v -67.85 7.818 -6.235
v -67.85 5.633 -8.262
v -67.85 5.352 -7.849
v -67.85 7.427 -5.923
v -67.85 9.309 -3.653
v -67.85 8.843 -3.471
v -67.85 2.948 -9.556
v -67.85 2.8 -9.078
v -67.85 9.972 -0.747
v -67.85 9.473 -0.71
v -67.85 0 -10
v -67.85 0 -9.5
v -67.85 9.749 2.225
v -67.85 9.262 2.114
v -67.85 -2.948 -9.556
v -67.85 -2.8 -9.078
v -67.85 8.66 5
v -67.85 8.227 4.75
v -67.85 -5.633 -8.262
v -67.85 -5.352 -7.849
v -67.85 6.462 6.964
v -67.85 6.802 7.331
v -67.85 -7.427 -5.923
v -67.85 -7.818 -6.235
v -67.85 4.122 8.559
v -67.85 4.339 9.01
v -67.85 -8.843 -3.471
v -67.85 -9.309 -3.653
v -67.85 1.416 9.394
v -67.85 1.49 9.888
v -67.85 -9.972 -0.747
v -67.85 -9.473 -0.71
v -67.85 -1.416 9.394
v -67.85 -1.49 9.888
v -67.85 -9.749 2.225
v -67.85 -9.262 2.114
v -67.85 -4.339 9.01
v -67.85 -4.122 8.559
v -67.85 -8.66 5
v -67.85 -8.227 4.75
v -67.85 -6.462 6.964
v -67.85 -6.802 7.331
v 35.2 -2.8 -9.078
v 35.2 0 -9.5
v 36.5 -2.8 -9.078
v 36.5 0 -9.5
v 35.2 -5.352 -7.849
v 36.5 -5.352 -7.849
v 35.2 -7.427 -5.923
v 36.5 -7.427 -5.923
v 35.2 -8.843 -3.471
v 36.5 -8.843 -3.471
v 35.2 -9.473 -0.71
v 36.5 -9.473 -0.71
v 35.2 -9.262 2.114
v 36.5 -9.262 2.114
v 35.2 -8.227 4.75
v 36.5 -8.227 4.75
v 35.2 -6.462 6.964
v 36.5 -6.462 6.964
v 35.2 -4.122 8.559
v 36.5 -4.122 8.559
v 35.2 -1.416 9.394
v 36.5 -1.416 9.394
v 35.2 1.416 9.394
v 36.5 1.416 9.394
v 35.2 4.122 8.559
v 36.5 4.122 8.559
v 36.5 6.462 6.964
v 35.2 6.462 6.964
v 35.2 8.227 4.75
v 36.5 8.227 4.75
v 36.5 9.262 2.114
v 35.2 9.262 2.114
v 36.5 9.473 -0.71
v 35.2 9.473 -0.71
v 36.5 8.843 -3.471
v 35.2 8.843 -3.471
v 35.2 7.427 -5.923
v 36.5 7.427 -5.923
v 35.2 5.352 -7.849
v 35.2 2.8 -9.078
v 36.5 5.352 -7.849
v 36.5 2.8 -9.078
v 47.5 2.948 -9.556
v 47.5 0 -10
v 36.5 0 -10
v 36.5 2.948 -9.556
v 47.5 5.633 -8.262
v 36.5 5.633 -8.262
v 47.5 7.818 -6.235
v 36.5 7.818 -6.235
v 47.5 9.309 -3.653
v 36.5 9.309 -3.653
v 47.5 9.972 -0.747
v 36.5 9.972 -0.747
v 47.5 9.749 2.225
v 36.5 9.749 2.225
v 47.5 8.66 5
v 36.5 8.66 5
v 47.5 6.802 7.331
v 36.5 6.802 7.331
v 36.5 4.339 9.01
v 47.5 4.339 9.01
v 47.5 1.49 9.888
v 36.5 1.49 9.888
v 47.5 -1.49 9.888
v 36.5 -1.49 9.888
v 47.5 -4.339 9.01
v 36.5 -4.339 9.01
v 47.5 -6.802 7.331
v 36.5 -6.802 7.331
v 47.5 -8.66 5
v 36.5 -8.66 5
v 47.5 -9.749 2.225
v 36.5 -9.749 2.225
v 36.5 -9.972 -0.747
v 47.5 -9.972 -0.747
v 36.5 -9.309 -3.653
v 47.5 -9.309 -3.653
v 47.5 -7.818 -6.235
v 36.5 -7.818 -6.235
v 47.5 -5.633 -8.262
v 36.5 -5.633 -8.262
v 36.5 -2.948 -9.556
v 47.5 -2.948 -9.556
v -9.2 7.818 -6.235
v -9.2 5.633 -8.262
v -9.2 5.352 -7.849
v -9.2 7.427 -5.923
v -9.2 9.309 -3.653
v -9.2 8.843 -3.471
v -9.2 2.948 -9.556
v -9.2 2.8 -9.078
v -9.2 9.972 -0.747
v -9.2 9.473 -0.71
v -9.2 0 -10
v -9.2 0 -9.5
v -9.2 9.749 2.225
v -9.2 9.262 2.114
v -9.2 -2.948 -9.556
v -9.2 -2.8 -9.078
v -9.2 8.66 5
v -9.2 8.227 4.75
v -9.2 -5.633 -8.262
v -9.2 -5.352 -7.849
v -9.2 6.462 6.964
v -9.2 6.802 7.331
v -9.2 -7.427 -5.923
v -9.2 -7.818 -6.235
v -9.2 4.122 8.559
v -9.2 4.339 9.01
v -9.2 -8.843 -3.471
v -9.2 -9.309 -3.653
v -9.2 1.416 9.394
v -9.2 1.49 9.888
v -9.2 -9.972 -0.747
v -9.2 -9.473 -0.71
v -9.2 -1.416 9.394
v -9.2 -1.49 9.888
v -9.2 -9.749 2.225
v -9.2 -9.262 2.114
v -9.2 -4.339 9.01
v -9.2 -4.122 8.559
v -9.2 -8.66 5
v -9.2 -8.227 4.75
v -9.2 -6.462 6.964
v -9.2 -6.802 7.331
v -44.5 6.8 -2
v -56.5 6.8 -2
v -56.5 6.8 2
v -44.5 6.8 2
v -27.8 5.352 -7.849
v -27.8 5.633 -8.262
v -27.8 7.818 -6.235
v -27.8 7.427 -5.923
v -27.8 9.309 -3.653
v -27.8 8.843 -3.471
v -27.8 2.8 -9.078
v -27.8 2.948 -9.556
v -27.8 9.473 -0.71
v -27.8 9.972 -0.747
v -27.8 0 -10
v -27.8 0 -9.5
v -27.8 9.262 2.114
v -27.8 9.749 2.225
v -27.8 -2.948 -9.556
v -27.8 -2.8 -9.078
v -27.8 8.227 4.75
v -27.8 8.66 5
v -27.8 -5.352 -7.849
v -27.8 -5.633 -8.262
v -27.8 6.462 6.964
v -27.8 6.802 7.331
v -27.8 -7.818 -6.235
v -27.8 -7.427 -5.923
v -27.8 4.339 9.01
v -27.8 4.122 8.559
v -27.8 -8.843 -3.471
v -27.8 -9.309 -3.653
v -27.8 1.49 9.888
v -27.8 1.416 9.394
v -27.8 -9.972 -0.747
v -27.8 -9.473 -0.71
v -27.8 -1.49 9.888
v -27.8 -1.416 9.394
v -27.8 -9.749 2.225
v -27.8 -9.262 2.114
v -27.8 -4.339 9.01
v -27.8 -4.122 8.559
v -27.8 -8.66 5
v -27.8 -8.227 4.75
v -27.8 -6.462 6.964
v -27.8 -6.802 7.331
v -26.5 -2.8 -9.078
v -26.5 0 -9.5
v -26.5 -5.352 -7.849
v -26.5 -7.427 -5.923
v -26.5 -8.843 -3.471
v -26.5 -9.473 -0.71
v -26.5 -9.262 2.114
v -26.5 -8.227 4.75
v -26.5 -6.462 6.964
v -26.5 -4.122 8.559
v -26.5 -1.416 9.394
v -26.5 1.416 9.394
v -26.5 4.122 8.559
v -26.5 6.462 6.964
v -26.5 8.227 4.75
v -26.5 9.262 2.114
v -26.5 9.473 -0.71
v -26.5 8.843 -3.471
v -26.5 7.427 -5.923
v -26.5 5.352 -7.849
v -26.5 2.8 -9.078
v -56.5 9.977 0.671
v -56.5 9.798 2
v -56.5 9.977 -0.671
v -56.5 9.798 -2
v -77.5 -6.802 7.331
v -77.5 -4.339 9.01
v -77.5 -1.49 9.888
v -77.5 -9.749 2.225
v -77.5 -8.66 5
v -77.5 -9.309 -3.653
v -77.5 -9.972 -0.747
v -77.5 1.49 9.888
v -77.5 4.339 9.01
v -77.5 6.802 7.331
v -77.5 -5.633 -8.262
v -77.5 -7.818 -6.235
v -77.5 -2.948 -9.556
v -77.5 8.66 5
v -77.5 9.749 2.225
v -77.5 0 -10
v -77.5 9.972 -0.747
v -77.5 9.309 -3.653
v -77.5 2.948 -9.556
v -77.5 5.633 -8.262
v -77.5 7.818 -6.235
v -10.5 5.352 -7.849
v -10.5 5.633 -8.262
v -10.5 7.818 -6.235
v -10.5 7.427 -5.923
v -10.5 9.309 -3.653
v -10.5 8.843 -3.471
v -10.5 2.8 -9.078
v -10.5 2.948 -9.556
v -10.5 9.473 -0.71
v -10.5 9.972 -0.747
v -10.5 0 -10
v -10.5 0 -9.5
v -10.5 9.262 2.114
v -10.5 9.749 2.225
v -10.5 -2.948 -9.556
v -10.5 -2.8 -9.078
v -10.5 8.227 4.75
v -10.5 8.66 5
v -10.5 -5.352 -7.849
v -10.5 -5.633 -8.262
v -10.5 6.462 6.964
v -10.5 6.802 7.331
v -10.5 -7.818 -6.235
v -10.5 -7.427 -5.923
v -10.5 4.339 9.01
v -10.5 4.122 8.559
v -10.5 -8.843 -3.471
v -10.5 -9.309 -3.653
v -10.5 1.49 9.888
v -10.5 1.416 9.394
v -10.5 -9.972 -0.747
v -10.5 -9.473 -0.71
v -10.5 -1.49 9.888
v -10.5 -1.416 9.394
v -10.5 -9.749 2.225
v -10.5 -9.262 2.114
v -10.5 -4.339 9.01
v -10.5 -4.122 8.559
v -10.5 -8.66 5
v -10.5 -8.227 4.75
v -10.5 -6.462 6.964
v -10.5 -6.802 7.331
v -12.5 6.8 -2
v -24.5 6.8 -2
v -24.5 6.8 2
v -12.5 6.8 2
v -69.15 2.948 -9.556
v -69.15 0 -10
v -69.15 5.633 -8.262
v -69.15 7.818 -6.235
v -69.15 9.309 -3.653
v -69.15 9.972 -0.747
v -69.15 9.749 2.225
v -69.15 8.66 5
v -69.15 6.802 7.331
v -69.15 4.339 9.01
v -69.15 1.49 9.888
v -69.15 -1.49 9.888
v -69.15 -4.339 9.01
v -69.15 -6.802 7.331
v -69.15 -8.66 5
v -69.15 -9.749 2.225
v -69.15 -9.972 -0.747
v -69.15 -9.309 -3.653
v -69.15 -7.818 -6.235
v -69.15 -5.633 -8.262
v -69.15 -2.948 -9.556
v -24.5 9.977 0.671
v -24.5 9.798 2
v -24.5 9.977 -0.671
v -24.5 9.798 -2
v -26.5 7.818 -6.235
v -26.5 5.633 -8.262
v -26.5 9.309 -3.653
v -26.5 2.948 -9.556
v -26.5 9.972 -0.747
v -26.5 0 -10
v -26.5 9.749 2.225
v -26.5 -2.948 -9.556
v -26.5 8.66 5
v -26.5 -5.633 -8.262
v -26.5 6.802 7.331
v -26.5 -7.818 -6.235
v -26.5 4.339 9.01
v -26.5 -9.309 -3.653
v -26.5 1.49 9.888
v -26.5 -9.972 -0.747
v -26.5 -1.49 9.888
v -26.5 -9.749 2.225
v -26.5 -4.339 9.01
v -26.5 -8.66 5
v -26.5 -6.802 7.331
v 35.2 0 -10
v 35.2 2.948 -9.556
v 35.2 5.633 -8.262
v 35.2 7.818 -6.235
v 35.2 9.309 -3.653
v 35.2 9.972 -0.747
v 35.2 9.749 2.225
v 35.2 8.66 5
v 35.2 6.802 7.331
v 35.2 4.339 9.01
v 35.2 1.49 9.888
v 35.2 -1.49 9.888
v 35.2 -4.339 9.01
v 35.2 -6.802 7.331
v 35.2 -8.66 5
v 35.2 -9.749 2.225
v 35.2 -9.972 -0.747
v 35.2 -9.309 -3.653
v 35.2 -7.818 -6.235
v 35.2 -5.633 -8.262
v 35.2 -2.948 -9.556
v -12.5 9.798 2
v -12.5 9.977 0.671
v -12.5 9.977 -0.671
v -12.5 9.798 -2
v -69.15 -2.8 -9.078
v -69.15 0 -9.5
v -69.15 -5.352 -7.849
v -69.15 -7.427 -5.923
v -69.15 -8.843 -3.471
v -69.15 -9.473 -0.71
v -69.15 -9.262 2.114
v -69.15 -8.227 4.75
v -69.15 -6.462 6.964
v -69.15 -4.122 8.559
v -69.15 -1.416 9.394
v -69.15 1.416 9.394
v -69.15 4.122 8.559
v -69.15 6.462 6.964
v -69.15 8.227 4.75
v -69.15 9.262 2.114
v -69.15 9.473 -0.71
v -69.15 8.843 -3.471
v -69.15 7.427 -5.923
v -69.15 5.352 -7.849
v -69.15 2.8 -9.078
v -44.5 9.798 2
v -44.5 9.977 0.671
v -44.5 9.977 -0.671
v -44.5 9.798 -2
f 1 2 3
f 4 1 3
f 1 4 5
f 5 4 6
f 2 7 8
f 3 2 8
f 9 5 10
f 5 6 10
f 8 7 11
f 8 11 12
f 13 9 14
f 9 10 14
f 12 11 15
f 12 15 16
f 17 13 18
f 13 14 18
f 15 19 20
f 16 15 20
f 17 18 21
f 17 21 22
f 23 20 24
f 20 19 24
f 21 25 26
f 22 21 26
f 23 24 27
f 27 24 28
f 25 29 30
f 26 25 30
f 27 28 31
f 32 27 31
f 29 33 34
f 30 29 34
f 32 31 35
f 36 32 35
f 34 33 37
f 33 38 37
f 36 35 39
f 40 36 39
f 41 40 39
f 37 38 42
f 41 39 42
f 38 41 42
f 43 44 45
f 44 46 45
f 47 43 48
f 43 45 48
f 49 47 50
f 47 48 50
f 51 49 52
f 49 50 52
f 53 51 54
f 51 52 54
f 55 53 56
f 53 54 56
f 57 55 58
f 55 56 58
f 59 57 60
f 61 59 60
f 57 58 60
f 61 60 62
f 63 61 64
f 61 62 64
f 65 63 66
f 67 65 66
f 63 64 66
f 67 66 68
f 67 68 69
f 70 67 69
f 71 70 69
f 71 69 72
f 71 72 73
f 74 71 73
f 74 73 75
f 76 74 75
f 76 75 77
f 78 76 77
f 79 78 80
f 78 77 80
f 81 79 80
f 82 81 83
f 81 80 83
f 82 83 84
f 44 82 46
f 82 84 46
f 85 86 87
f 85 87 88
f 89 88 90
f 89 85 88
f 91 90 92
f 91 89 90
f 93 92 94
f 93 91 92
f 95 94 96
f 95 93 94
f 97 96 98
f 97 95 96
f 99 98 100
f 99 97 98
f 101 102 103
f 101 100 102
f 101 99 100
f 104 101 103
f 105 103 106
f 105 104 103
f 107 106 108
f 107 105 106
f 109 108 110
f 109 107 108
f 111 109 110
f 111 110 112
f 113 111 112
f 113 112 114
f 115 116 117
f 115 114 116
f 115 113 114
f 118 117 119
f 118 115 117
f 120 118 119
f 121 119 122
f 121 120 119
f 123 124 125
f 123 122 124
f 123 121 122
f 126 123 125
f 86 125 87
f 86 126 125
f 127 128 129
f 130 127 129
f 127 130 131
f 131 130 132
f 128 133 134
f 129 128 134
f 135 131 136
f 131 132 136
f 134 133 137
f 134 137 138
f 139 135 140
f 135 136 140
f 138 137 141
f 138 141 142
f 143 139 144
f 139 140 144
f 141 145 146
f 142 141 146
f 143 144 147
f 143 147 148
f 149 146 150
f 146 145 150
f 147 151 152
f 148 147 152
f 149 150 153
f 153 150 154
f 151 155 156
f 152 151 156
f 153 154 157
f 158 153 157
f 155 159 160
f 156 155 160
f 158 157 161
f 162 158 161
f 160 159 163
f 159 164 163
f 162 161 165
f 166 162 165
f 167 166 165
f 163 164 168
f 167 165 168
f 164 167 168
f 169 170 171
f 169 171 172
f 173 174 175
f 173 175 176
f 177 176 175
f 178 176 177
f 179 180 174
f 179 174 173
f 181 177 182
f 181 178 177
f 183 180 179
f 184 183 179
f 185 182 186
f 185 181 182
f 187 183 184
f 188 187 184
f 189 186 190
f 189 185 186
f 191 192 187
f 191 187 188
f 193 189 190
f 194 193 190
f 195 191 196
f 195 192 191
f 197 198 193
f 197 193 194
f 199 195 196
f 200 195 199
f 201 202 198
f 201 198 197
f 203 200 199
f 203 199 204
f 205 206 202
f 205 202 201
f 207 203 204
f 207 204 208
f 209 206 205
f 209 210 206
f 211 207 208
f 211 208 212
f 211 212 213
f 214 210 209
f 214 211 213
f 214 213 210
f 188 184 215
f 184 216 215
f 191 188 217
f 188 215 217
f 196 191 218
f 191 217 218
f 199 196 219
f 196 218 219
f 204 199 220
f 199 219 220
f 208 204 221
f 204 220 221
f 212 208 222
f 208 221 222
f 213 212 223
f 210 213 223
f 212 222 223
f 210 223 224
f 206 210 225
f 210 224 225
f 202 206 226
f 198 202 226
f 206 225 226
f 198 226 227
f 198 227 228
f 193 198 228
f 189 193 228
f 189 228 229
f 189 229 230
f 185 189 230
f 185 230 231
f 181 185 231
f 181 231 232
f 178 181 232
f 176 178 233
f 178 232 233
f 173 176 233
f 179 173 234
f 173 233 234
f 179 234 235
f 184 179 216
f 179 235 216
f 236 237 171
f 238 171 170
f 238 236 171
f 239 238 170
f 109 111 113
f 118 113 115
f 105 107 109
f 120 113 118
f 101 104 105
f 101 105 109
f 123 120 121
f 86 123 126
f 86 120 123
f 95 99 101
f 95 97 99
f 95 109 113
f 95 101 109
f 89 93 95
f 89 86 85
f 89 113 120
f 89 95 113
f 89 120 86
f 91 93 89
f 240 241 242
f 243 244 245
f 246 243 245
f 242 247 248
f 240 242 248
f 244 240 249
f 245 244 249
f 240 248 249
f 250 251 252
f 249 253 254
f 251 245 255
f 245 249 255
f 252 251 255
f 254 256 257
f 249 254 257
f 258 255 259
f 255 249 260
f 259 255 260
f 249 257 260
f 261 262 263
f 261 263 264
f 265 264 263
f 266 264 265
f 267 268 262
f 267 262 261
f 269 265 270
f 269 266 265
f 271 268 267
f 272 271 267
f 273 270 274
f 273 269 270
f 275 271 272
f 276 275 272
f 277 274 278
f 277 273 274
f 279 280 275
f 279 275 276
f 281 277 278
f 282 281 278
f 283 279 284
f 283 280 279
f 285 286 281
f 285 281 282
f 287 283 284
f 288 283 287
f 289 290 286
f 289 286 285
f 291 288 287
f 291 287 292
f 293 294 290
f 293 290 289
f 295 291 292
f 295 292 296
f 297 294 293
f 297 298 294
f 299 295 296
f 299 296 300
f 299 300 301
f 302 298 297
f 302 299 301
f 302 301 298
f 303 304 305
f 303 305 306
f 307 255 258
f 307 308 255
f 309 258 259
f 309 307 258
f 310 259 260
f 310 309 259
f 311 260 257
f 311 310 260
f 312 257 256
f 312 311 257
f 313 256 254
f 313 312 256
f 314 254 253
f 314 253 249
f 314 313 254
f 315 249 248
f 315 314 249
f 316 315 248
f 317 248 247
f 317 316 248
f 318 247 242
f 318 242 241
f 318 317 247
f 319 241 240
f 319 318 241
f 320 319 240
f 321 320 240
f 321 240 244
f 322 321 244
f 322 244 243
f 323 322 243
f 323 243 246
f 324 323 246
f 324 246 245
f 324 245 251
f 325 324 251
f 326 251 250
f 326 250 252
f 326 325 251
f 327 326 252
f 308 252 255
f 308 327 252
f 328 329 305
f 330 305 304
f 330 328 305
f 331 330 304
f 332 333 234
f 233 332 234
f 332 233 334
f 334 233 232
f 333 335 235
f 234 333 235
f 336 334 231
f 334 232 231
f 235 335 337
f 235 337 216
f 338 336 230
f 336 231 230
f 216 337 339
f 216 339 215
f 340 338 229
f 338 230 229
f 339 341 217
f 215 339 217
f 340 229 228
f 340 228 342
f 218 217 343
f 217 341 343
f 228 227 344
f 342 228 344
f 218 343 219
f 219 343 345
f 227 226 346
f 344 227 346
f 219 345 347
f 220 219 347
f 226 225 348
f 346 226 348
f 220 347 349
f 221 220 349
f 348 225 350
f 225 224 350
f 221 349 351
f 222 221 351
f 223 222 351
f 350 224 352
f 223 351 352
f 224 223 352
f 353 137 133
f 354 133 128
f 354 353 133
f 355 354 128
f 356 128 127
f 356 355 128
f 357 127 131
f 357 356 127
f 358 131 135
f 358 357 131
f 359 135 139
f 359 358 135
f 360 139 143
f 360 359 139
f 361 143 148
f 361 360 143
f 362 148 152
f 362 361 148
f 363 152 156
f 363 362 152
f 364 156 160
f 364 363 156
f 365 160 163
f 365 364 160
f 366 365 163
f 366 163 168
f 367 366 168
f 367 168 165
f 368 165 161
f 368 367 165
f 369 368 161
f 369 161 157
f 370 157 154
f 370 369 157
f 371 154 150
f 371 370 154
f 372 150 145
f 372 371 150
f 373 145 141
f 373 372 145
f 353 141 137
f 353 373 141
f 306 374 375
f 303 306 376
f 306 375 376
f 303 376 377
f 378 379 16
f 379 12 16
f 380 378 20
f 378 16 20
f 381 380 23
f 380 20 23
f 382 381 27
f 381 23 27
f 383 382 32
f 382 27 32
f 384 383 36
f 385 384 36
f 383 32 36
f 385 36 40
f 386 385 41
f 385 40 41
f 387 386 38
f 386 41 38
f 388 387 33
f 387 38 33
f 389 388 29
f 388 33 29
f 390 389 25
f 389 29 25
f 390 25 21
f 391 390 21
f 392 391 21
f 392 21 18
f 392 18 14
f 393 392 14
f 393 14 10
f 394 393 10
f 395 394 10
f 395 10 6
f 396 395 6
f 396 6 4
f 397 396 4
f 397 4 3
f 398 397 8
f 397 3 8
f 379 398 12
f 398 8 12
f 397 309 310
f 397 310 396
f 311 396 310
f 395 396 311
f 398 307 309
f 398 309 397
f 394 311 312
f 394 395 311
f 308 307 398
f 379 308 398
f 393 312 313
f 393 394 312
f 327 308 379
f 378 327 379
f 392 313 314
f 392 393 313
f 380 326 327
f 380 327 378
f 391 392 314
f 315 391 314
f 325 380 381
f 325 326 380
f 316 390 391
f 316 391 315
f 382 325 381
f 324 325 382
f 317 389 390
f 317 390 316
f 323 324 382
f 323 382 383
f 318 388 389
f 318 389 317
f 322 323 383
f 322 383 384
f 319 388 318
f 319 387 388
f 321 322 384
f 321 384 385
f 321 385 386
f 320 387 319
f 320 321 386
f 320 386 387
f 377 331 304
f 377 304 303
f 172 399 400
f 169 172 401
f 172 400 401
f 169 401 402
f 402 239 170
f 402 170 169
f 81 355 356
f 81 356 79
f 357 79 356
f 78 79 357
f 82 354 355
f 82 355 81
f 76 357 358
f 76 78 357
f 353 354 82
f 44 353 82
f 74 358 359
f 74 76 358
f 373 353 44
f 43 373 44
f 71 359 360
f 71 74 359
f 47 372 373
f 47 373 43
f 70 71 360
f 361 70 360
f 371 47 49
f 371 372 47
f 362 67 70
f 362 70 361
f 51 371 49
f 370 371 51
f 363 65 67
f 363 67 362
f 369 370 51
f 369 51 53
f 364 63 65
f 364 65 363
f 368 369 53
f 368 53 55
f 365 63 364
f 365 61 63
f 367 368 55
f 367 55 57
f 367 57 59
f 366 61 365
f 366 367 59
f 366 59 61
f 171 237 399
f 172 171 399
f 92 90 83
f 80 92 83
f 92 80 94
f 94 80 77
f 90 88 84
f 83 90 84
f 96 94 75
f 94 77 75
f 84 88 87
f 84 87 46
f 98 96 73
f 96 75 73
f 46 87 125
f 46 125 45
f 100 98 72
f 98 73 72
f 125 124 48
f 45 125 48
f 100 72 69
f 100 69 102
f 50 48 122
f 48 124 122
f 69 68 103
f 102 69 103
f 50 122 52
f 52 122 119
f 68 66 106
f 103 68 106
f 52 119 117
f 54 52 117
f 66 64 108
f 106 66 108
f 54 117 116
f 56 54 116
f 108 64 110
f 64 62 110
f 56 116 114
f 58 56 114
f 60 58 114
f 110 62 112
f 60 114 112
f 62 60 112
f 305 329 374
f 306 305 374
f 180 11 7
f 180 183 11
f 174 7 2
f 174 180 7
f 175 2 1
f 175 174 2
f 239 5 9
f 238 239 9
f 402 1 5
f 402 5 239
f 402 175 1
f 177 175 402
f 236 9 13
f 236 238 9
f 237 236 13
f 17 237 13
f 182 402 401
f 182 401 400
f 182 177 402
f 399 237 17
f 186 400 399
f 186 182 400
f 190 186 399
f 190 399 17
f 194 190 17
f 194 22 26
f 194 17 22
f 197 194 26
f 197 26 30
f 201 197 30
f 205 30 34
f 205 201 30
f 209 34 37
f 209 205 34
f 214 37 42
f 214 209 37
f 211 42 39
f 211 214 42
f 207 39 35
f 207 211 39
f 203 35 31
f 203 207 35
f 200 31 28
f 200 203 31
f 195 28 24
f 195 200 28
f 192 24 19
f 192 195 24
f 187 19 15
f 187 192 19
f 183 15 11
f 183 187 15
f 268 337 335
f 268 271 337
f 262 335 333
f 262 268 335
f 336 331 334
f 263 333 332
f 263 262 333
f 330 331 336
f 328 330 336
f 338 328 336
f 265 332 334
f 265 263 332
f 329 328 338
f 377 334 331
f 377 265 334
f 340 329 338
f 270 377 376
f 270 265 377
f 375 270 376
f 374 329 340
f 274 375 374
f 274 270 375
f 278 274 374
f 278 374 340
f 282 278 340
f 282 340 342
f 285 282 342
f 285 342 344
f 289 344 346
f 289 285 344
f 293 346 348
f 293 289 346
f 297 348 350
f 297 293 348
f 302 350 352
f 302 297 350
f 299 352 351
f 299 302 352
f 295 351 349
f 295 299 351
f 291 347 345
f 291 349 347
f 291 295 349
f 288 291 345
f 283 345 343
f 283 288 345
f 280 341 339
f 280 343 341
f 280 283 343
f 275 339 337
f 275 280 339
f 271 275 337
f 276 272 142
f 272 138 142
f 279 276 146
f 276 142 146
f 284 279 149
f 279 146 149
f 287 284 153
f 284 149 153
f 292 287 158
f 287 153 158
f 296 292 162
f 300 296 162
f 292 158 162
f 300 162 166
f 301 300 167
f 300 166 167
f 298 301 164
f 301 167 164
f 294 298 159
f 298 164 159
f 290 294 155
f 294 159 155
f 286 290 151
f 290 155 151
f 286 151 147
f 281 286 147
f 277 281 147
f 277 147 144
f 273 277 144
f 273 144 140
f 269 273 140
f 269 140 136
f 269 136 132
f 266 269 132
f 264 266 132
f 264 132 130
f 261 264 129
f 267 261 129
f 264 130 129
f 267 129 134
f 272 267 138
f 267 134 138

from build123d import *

# Parameters (mm, degrees)
SKETCH1_R           = 10
BOSS_EXTRUDE1_DEPTH = 77.5
SKETCH2_W           = 12
SKETCH2_H           = 4
CUT_EXTRUDE1_DEPTH  = 3.2
SKETCH5_W           = 1.3
SKETCH5_H           = 0.5
SKETCH6_W           = 30
SKETCH6_H           = 20
CUT_EXTRUDE2_DEPTH  = 81.661329025


with BuildPart() as part:
    # Sketch1 → Boss-Extrude1 (new, symmetric)
    with BuildSketch(Plane(origin=(0, 0, 0), x_dir=(0, 0, -1), z_dir=(1, 0, 0))):
        Circle(SKETCH1_R)
    extrude(amount=BOSS_EXTRUDE1_DEPTH, both=True)

    # Sketch2 → Cut-Extrude1 (cut)
    with BuildSketch(Plane(origin=(0, 10, 0), x_dir=(1, 0, 0), z_dir=(0, 1, 0))):
        with Locations((-50.5, 0)):
            Rectangle(SKETCH2_W, SKETCH2_H)
        with Locations((-18.5, 0)):
            Rectangle(SKETCH2_W, SKETCH2_H)
        with Locations((66.5, 0)):
            Rectangle(SKETCH2_W, SKETCH2_H)
    extrude(amount=-CUT_EXTRUDE1_DEPTH, mode=Mode.SUBTRACT)

    # Sketch5 → Cut-Revolve2 (revolve, cut)
    with BuildSketch(Plane.XY, mode=Mode.PRIVATE) as cut_revolve2_sk:
        with Locations((-27.15, 9.75)):
            Rectangle(SKETCH5_W, SKETCH5_H)
        with Locations((-9.85, 9.75)):
            Rectangle(SKETCH5_W, SKETCH5_H)
        with Locations((75.15, 9.75)):
            Rectangle(SKETCH5_W, SKETCH5_H)
        with Locations((57.85, 9.75)):
            Rectangle(SKETCH5_W, SKETCH5_H)
        with Locations((35.85, 9.75)):
            Rectangle(SKETCH5_W, SKETCH5_H)
        with Locations((-68.5, 9.75)):
            Rectangle(SKETCH5_W, SKETCH5_H)
    revolve(cut_revolve2_sk.sketch.rotate(Axis((0, 0, 0), (-1, 0, 0)), 90), axis=Axis((0, 0, 0), (-1, 0, 0)), mode=Mode.SUBTRACT)

    # Sketch6 → Cut-Extrude2 (cut, through all)
    with BuildSketch(Plane(origin=(0, 10, 0), x_dir=(1, 0, 0), z_dir=(0, 1, 0))):
        with Locations((62.5, 0)):
            Rectangle(SKETCH6_W, SKETCH6_H)
    extrude(amount=-CUT_EXTRUDE2_DEPTH, mode=Mode.SUBTRACT)


solid = part.part
